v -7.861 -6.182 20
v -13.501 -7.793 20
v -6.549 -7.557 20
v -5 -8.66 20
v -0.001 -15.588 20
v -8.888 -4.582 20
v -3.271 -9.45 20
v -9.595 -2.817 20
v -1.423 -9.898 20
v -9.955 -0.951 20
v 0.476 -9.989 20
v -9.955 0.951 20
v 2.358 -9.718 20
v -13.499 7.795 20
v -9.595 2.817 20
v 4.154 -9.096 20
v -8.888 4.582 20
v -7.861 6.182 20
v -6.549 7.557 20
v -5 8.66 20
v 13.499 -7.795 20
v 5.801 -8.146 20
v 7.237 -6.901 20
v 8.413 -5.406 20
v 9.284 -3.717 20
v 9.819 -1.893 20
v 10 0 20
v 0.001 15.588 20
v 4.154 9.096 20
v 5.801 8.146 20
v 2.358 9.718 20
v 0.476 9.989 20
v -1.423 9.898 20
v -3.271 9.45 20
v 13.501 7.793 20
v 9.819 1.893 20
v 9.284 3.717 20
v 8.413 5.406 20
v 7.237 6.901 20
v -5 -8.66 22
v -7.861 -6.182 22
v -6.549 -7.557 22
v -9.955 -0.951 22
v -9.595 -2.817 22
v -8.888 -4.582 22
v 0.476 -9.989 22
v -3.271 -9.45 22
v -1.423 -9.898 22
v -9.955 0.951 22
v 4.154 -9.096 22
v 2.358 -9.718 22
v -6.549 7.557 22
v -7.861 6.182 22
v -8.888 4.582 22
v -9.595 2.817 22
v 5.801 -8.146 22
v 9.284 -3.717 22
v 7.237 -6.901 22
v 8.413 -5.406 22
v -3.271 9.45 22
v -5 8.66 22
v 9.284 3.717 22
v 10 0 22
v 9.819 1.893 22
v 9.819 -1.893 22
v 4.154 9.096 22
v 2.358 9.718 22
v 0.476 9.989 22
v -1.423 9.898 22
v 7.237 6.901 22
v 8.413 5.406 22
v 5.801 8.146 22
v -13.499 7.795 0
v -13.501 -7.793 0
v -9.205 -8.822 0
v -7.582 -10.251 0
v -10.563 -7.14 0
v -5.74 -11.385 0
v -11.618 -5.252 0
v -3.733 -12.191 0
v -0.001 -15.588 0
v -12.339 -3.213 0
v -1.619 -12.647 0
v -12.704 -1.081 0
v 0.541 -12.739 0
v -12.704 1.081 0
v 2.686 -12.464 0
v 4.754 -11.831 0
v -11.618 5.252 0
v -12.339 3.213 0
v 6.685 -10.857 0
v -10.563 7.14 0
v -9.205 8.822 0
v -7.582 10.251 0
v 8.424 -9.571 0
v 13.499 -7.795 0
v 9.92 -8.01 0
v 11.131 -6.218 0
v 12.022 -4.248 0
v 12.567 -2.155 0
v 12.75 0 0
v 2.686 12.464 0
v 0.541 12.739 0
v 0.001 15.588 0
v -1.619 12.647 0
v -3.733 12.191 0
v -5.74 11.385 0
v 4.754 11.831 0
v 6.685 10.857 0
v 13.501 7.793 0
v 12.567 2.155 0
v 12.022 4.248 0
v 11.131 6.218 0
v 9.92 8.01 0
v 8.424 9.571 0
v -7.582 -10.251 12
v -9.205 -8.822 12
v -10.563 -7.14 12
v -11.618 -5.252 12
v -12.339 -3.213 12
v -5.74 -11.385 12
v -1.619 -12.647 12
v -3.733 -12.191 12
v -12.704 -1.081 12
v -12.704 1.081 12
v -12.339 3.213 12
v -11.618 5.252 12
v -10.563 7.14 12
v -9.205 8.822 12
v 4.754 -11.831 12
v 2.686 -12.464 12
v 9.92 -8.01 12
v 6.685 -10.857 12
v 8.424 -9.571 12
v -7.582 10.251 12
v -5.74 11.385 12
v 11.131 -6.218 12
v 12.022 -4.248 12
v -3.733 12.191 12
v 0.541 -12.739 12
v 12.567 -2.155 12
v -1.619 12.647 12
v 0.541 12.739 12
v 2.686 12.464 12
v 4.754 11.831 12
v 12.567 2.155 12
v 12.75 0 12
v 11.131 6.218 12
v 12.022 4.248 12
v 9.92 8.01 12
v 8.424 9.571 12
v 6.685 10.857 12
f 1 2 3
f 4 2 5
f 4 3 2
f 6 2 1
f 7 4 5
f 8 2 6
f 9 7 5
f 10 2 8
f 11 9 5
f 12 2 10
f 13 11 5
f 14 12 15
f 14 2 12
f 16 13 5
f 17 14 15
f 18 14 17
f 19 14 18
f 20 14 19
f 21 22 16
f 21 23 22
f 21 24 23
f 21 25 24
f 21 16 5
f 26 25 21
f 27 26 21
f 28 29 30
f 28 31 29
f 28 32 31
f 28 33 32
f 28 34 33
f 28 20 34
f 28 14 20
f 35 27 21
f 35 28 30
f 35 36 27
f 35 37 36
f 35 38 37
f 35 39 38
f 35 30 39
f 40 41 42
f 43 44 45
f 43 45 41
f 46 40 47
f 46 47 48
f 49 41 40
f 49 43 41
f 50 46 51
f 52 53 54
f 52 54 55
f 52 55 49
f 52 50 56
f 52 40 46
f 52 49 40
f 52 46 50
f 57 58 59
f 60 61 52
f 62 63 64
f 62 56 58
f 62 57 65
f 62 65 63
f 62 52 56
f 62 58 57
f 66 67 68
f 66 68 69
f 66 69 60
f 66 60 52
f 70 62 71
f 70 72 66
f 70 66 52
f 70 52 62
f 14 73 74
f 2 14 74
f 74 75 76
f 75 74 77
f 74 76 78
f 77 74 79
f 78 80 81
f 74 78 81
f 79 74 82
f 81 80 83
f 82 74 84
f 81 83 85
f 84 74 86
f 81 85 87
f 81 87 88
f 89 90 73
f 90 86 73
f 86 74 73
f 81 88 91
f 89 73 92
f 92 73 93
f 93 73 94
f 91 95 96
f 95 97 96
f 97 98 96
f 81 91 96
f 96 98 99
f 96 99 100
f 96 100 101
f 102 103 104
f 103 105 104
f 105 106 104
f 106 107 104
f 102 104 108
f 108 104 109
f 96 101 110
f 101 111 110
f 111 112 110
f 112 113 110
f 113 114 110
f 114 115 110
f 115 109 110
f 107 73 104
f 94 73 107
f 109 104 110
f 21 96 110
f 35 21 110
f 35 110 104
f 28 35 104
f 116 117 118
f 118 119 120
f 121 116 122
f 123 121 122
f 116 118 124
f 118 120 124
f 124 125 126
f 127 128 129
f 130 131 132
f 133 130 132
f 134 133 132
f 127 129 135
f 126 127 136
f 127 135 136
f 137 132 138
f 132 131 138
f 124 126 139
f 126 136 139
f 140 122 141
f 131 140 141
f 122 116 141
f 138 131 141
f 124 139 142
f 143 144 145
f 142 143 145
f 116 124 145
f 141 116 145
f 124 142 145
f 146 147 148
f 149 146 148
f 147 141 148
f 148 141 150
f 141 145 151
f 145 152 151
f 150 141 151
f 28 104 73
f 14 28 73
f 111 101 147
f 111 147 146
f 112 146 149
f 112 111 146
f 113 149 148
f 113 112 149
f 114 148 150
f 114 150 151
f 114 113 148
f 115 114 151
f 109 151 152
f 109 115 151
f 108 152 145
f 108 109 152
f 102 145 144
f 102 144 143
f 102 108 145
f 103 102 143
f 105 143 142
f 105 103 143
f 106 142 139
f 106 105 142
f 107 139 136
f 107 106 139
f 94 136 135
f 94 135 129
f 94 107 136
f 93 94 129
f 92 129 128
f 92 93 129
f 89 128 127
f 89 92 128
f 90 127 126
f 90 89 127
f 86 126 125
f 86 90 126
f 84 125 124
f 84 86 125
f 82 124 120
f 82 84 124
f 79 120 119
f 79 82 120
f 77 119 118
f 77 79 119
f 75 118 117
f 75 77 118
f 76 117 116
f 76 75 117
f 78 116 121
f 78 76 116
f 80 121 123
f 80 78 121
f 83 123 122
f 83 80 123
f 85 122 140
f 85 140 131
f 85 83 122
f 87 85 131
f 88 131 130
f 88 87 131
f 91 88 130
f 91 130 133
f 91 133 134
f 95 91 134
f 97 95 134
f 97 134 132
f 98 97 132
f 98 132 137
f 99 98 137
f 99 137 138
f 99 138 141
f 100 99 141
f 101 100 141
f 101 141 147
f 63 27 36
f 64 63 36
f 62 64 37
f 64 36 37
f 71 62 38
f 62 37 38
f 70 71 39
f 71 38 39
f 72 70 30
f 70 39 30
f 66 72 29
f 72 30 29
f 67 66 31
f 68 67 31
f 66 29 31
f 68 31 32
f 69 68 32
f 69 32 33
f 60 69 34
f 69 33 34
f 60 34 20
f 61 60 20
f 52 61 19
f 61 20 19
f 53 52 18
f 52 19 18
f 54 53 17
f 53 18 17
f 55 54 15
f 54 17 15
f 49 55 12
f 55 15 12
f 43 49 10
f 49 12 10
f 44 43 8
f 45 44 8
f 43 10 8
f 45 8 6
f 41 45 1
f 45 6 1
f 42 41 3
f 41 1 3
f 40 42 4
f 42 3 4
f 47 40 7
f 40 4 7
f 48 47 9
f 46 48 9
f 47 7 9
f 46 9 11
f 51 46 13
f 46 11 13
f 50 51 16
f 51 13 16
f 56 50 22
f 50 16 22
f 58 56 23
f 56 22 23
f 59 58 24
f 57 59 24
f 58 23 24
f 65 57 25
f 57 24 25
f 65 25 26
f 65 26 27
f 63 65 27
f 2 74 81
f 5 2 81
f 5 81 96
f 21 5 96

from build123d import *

# Parameters (mm, degrees)
F1_DEPTH = 20
F2_R     = 12.75
F3_DEPTH = 12
F4_R     = 10
F5_DEPTH = 2


with BuildPart() as f1:
    # F0 (on Top) → F1 (new body)
    with BuildSketch(Plane.XY):
        Polygon((0.001339, 15.588457), (-13.499331, 7.795388), (-13.500669, -7.793069), (-0.001339, -15.588457), (13.499331, -7.795388), (13.500669, 7.793069), align=None)
    extrude(amount=F1_DEPTH)

    # F2 (on Top) → F3 (cut)
    with BuildSketch(Plane.XY):
        Circle(F2_R)
    extrude(amount=F3_DEPTH, mode=Mode.SUBTRACT)

    # F4 (on face) → F5 (join)
    with BuildSketch(Plane.XY.offset(20)):
        Circle(F4_R)
    extrude(amount=F5_DEPTH)


solid = f1.part
